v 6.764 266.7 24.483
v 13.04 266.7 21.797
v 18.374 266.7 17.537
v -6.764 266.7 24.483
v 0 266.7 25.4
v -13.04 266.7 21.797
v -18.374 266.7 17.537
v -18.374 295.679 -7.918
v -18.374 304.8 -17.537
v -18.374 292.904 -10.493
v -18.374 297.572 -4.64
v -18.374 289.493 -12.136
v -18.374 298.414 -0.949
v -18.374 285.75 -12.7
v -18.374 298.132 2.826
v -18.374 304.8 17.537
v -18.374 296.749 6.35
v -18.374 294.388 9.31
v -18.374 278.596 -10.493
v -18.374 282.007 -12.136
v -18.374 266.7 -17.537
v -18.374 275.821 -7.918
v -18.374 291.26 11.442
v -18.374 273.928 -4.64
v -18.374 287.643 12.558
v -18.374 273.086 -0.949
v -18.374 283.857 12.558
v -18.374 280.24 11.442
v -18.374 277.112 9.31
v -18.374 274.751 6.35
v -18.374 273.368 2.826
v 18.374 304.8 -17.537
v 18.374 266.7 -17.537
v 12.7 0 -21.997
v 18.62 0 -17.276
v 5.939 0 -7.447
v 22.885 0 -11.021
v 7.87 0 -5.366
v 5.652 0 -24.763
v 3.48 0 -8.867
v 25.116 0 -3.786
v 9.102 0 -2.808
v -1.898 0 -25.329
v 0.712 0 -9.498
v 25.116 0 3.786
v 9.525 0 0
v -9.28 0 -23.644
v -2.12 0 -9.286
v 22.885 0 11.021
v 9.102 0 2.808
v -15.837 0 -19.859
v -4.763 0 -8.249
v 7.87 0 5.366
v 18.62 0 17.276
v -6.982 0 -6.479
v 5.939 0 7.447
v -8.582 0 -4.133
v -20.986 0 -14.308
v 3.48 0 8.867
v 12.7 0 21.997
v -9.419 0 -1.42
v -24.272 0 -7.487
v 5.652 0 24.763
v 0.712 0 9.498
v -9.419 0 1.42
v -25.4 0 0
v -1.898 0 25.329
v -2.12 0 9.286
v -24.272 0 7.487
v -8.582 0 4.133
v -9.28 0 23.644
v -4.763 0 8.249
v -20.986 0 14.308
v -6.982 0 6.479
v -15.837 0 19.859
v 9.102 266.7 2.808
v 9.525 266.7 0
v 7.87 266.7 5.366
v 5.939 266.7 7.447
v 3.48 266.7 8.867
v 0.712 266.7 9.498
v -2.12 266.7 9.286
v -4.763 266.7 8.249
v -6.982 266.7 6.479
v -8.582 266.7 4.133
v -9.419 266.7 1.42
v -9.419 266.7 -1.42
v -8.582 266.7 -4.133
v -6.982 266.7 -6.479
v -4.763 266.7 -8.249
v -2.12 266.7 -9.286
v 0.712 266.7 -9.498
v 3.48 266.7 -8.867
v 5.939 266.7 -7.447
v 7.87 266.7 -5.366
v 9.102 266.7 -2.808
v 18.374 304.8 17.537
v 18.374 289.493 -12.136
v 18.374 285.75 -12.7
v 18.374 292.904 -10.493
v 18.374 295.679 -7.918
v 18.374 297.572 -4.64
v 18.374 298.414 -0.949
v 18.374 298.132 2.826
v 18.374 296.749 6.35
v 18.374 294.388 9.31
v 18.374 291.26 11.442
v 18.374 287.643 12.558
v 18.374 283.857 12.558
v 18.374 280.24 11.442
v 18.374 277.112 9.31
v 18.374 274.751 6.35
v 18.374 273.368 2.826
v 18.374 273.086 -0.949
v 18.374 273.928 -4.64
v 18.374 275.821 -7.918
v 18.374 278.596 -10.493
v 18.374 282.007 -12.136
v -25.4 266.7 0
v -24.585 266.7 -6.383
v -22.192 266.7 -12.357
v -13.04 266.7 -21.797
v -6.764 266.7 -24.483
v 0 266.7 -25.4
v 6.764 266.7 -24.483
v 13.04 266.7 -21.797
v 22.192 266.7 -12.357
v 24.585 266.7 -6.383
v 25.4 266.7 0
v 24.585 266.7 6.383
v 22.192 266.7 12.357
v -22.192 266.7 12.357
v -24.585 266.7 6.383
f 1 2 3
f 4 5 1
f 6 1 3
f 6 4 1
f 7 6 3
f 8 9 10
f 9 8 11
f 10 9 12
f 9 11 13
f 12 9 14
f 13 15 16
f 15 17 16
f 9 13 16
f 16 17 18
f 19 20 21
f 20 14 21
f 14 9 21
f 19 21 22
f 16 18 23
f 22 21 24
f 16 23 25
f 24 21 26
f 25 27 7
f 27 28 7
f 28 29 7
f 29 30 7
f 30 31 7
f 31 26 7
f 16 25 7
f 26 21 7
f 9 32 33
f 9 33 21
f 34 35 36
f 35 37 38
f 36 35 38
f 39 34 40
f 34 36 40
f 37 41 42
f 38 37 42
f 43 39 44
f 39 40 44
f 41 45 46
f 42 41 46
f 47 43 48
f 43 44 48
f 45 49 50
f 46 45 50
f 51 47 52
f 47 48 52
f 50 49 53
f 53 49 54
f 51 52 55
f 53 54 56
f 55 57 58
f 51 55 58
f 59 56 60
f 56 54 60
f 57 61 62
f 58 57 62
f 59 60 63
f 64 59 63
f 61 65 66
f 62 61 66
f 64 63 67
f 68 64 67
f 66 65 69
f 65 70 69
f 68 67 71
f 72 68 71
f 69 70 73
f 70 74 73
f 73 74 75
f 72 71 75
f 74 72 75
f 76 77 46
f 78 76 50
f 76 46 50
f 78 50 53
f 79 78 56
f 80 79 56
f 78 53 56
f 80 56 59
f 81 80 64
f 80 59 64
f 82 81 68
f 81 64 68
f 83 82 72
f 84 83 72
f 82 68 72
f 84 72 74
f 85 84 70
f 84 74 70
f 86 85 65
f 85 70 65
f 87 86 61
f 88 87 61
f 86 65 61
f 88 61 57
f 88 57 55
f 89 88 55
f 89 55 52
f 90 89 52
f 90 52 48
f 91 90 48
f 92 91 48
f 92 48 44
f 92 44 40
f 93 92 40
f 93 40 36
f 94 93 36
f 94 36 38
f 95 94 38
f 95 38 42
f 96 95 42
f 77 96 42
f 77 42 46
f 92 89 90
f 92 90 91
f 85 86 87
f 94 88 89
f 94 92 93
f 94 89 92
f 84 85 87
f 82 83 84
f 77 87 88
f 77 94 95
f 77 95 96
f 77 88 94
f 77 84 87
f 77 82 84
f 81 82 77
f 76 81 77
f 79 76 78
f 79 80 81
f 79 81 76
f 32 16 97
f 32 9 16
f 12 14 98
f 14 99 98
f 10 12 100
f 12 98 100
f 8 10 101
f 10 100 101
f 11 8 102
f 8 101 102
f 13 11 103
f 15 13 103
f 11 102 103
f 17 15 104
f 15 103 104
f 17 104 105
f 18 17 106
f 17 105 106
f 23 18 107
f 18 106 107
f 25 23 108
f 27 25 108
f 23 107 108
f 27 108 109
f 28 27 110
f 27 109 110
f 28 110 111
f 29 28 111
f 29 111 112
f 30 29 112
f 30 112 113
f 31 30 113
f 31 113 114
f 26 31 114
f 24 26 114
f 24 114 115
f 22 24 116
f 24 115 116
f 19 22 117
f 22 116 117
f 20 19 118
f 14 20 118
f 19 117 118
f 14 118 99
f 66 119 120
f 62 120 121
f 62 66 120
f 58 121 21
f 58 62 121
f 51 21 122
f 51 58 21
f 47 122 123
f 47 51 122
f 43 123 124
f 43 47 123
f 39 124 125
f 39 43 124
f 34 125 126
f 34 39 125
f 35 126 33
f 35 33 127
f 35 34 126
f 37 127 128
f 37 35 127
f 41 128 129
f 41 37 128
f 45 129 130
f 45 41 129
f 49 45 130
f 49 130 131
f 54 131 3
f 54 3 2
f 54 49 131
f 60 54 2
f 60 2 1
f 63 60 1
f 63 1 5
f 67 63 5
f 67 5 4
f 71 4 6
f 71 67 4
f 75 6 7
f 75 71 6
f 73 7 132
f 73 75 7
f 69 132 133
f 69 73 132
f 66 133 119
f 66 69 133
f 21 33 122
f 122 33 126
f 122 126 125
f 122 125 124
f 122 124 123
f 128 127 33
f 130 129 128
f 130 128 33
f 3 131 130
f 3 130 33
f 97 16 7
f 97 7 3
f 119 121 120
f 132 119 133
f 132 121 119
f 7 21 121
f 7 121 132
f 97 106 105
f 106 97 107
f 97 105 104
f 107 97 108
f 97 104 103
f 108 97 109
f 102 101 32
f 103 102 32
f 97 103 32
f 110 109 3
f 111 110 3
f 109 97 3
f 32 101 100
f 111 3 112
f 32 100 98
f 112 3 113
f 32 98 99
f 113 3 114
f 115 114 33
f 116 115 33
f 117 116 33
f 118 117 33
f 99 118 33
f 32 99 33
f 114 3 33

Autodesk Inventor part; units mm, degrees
ref_plane "YZ Plane" through (0, 0, 0) normal (1, 0, 0) x (0, 1, 0)
ref_plane "XZ Plane" through (0, 0, 0) normal (0, 1, 0) x (-1, 0, 0)
ref_plane "XY Plane" through (0, 0, 0) normal (0, 0, 1) x (1, 0, 0)
sketch "Sketch1" plane through (0, 0, 0) normal (0, 1, 0) x (-1, 0, 0)
  circle A0 centre (0, 0) radius 25.4
  dimension "d0" = 50.8
extrude "Extrusion1" add sketch "Sketch1" along normal blind 266.7
sketch "Sketch2" plane through (0, 266.7, 0) normal (0, 1, 0) x (1, 0, 0)
  circle A0 centre (0, 0) radius 25.4 projected
  line L0 (-18.3739, -17.5374) -> (18.3739, -17.5374)
  line L1 (18.3739, -17.5374) -> (18.3739, 17.5374)
  line L2 (18.3739, 17.5374) -> (-18.3739, 17.5374)
  line L3 (-18.3739, 17.5374) -> (-18.3739, -17.5374)
  line L4 (-18.3739, -17.5374) -> (18.3739, 17.5374) construction
  line L5 (18.3739, -17.5374) -> (-18.3739, 17.5374) construction
extrude "Extrusion4" add sketch "Sketch2" along normal blind 38.1 contours L1 L0 L3 L2
sketch "Sketch4" plane through (18.3739, 266.7, 17.5374) normal (1, 0, 0) x (0, 0, -1)
  circle A0 centre (17.5374, 19.05) radius 12.7
  point P0 (17.5374, -266.7)
  dimension "d10" = 25.4
extrude "Extrusion5" cut sketch "Sketch4" against normal blind 38.1
sketch "Sketch5" plane through (0, 0, 0) normal (0, -1, 0) x (1, 0, 0)
  circle A0 centre (0, 0) radius 9.525
  dimension "d13" = 19.05
extrude "Extrusion6" cut sketch "Sketch5" against normal blind 266.7
properties part number "cylendar" material "Aluminum 6061"
